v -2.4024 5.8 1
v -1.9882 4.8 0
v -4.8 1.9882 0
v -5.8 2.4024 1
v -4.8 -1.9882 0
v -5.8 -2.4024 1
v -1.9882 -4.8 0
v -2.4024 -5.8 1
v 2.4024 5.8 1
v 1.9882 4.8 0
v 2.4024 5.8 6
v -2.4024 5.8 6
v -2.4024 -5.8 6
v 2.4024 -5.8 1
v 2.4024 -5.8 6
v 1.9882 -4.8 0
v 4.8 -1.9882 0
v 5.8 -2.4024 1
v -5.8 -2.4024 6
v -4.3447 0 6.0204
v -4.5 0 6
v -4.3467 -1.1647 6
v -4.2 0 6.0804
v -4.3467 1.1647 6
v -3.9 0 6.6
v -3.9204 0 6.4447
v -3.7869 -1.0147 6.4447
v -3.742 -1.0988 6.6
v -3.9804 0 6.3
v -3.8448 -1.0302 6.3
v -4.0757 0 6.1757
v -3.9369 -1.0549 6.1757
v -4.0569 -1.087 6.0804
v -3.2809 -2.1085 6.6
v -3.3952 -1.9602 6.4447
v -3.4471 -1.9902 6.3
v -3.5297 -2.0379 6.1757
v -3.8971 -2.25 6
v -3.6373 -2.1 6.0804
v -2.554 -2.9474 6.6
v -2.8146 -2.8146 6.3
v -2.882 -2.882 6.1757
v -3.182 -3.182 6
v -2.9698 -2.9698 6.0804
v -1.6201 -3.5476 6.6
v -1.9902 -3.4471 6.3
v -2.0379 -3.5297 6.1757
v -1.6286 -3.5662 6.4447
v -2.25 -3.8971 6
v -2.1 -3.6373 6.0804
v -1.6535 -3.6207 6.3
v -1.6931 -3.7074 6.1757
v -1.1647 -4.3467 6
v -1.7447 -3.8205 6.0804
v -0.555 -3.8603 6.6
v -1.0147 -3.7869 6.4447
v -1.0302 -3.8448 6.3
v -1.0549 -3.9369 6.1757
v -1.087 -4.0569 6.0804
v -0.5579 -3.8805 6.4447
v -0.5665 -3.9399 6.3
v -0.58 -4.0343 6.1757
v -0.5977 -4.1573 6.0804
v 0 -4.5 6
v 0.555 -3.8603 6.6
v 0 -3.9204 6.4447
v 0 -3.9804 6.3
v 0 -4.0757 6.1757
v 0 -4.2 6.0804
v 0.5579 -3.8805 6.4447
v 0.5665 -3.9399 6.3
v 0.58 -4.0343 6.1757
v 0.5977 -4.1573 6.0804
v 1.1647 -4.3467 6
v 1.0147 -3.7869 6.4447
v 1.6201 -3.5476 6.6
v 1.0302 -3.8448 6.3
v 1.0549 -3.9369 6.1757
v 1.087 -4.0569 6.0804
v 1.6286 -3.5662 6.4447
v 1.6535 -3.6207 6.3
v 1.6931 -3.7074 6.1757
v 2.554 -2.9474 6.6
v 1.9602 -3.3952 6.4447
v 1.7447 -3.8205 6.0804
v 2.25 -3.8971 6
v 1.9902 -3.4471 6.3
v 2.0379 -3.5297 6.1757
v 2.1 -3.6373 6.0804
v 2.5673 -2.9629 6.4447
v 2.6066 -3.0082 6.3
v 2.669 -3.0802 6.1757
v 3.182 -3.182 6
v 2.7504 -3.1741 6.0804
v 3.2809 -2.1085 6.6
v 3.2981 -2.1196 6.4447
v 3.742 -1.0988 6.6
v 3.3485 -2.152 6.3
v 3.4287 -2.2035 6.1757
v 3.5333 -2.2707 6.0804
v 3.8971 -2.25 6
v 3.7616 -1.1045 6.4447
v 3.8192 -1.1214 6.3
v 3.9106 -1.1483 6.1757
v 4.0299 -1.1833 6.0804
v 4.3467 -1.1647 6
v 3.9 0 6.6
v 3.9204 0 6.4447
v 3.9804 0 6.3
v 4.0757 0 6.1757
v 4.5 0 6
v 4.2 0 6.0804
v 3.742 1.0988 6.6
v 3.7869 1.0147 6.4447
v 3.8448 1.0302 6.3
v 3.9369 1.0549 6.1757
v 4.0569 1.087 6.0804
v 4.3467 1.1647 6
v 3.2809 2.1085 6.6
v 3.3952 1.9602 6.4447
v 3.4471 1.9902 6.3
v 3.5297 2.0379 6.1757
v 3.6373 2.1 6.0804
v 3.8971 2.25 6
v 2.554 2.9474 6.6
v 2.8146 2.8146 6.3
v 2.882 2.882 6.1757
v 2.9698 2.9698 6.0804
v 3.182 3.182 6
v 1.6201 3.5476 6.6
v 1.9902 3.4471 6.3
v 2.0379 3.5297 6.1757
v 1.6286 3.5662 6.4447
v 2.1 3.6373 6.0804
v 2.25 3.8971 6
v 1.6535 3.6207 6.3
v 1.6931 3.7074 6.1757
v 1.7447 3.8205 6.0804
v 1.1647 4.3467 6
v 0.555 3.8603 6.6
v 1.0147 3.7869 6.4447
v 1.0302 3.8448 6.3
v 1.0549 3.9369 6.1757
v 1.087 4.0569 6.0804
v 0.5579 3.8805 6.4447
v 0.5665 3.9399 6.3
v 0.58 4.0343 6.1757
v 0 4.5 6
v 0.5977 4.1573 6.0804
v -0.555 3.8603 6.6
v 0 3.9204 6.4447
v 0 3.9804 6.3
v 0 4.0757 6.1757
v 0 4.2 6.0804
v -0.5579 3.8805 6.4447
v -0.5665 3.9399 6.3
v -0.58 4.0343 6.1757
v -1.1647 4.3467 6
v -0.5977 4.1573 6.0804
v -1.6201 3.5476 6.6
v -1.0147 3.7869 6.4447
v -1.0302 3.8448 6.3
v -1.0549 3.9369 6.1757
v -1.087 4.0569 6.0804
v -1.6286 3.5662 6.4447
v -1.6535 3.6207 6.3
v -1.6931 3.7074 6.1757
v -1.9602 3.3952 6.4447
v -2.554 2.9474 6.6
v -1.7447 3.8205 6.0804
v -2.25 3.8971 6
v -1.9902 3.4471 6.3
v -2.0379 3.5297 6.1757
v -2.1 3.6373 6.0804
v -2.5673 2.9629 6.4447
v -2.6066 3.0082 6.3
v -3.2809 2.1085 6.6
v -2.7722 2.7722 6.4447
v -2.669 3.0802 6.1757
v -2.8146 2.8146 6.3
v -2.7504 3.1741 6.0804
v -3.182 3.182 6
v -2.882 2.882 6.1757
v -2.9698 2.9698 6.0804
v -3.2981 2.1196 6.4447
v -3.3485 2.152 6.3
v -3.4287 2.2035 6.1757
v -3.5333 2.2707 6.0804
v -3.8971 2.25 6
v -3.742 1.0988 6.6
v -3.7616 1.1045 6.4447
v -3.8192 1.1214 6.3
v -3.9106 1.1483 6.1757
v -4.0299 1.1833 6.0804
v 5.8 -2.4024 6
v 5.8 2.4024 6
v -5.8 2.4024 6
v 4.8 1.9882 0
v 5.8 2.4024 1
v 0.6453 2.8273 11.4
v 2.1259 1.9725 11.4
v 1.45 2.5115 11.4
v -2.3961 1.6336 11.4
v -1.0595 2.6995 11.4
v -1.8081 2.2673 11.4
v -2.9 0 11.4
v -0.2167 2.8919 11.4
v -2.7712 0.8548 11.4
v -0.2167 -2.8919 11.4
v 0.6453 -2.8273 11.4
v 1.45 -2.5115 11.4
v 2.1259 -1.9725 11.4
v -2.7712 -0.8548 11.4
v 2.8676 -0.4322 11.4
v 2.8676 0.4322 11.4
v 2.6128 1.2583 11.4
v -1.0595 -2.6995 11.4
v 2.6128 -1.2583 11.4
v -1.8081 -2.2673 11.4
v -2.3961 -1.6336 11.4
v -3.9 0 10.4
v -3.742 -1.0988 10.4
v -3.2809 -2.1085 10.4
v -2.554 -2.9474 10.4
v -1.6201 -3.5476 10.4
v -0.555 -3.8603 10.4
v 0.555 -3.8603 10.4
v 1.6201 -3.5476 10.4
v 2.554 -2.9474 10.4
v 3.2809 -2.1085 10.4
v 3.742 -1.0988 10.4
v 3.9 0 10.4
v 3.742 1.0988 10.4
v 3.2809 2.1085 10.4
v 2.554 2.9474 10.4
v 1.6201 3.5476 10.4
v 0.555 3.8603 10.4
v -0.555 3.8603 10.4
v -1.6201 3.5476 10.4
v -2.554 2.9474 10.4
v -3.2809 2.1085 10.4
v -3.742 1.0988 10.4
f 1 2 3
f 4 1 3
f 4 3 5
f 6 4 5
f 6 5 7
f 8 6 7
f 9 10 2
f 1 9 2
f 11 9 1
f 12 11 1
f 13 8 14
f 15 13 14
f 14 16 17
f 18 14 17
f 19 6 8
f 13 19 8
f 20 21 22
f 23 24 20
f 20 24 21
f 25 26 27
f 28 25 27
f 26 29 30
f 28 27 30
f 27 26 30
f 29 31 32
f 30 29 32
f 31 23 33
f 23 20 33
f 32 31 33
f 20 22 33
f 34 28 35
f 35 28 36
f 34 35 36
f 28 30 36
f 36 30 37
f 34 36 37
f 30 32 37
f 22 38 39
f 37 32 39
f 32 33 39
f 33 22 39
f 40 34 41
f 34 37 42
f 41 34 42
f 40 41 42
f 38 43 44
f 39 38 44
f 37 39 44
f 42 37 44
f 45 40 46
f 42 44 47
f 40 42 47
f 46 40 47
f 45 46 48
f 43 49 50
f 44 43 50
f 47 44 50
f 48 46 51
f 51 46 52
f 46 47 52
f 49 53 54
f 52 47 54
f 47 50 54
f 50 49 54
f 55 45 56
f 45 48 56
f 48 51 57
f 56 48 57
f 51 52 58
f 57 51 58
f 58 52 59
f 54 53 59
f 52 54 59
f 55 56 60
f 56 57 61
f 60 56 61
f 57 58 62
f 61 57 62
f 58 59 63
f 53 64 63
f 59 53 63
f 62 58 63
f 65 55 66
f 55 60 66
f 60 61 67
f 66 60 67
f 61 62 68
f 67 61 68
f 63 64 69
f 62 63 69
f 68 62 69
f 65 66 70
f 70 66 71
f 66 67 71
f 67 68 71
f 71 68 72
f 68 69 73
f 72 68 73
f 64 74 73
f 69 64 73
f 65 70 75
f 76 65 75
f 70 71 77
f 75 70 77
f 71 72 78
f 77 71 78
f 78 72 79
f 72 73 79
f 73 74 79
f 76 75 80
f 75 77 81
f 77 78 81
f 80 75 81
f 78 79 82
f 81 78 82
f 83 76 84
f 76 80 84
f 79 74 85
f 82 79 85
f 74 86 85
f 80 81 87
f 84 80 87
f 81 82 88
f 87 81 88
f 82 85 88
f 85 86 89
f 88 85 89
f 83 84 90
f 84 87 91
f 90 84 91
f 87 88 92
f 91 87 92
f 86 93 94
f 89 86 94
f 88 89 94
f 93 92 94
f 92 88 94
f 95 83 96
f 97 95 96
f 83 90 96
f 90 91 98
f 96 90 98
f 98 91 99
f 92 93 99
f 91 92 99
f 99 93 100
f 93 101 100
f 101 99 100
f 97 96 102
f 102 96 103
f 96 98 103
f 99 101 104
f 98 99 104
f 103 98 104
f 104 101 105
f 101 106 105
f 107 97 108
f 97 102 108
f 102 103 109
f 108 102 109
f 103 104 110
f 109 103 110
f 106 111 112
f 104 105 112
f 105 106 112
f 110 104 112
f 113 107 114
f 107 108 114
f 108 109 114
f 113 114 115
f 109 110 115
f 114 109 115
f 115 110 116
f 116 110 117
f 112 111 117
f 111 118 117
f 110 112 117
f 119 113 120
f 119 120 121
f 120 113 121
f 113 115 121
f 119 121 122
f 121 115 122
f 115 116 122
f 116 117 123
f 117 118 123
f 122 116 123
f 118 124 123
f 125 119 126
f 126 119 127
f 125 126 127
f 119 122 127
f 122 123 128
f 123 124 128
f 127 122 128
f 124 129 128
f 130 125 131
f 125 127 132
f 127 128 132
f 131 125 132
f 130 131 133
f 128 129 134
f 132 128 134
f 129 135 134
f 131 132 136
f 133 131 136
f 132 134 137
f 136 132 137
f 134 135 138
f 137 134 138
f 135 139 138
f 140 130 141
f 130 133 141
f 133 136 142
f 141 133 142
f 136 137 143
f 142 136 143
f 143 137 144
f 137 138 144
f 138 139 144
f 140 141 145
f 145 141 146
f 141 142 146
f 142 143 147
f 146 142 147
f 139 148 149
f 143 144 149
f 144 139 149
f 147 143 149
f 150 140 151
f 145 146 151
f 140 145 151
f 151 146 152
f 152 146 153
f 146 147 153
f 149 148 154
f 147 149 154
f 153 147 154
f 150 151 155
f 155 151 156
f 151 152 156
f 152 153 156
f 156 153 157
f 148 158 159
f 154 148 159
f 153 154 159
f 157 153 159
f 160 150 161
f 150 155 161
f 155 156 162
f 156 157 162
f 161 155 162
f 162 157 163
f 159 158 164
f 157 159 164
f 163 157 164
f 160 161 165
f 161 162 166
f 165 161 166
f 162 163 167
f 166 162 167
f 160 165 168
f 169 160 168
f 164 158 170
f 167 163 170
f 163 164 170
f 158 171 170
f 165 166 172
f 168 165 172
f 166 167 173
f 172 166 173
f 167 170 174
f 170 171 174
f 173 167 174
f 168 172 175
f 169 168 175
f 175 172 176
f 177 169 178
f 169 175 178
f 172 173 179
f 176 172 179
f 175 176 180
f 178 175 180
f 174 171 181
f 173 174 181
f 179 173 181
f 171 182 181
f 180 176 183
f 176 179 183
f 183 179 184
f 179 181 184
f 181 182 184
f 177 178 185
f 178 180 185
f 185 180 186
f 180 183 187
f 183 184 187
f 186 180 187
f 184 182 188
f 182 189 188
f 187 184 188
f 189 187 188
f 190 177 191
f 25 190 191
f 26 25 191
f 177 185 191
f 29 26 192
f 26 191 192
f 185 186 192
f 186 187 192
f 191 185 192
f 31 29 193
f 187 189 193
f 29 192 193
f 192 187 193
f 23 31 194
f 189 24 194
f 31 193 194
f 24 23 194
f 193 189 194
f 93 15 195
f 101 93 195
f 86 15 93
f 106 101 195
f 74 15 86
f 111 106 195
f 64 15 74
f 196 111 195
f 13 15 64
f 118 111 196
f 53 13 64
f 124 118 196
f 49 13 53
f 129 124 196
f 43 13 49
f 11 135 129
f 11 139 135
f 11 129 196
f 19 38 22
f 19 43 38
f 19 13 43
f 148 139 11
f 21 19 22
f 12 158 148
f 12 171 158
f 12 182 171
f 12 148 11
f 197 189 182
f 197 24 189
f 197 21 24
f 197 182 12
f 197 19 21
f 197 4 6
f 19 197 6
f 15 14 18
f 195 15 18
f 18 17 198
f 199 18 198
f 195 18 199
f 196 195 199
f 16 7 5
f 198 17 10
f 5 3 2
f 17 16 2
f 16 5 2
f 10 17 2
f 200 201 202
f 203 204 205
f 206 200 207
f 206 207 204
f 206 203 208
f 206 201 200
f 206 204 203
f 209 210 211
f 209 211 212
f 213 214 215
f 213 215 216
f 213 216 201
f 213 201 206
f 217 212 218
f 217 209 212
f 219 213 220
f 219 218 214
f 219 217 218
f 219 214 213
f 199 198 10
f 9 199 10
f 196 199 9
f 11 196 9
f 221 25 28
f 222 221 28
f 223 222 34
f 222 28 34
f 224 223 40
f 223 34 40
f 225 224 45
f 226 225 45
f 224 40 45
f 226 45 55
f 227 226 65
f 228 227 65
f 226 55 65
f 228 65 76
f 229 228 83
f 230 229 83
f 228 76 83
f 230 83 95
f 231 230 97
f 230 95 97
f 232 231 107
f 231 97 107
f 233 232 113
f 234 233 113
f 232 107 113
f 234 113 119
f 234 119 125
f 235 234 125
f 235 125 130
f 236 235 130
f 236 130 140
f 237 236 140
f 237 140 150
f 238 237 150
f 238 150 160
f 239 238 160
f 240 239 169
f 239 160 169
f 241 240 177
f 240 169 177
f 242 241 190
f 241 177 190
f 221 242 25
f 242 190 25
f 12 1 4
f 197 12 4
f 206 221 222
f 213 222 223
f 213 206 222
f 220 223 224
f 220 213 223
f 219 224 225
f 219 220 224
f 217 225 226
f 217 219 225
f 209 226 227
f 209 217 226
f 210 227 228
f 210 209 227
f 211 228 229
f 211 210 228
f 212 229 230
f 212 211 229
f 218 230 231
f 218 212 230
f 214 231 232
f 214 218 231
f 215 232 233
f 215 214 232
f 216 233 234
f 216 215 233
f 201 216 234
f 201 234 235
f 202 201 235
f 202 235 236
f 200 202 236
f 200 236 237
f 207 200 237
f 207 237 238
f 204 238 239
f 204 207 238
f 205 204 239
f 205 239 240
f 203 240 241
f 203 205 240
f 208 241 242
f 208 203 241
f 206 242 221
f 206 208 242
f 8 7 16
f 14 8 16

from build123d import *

# Parameters (mm, degrees)
SALIENTE_EXTRUIR1_DEPTH = 6
CROQUIS2_R              = 3.9
SALIENTE_EXTRUIR2_DEPTH = 5.4
CHAFL_N1_SIZE           = 1
REDONDEO1_R             = 0.6
CHAFL_N2_SIZE           = 1


with BuildPart() as part:
    # Croquis1 → Saliente-Extruir1 (new body)
    with BuildSketch(Plane(origin=(0, 0, 0), x_dir=(0, 1, 0), z_dir=(0, 0, 1))):
        Polygon((5.8, -2.402438662), (5.8, 2.402438662), (2.402438662, 5.8), (-2.402438662, 5.8), (-5.8, 2.402438662), (-5.8, -2.402438662), (-2.402438662, -5.8), (2.402438662, -5.8), align=None)
    extrude(amount=SALIENTE_EXTRUIR1_DEPTH)

    # Croquis2 → Saliente-Extruir2 (add)
    with BuildSketch(Plane.XY.offset(6)):
        with Locations(Location((0, 0, 0), (0, 0, 180))):
            Circle(CROQUIS2_R)
    extrude(amount=SALIENTE_EXTRUIR2_DEPTH)

    # Chaflán1
    chafl_n1_edges = [part.edges().sort_by_distance(p)[0] for p in [
        (3.9, 0, 11.4),
    ]]
    chamfer(chafl_n1_edges, length=CHAFL_N1_SIZE)

    # Redondeo1
    redondeo1_edges = [part.edges().sort_by_distance(p)[0] for p in [
        (3.9, 0, 6),
    ]]
    fillet(redondeo1_edges, radius=REDONDEO1_R)

    # Chaflán2
    chafl_n2_edges = [part.edges().sort_by_distance(p)[0] for p in [
        (-5.8, 0, 0),
        (-4.101219331, 4.101219331, 0),
        (0, 5.8, 0),
        (4.101219331, 4.101219331, 0),
        (5.8, 0, 0),
        (4.101219331, -4.101219331, 0),
        (0, -5.8, 0),
        (-4.101219331, -4.101219331, 0),
    ]]
    chamfer(chafl_n2_edges, length=CHAFL_N2_SIZE)


solid = part.part
